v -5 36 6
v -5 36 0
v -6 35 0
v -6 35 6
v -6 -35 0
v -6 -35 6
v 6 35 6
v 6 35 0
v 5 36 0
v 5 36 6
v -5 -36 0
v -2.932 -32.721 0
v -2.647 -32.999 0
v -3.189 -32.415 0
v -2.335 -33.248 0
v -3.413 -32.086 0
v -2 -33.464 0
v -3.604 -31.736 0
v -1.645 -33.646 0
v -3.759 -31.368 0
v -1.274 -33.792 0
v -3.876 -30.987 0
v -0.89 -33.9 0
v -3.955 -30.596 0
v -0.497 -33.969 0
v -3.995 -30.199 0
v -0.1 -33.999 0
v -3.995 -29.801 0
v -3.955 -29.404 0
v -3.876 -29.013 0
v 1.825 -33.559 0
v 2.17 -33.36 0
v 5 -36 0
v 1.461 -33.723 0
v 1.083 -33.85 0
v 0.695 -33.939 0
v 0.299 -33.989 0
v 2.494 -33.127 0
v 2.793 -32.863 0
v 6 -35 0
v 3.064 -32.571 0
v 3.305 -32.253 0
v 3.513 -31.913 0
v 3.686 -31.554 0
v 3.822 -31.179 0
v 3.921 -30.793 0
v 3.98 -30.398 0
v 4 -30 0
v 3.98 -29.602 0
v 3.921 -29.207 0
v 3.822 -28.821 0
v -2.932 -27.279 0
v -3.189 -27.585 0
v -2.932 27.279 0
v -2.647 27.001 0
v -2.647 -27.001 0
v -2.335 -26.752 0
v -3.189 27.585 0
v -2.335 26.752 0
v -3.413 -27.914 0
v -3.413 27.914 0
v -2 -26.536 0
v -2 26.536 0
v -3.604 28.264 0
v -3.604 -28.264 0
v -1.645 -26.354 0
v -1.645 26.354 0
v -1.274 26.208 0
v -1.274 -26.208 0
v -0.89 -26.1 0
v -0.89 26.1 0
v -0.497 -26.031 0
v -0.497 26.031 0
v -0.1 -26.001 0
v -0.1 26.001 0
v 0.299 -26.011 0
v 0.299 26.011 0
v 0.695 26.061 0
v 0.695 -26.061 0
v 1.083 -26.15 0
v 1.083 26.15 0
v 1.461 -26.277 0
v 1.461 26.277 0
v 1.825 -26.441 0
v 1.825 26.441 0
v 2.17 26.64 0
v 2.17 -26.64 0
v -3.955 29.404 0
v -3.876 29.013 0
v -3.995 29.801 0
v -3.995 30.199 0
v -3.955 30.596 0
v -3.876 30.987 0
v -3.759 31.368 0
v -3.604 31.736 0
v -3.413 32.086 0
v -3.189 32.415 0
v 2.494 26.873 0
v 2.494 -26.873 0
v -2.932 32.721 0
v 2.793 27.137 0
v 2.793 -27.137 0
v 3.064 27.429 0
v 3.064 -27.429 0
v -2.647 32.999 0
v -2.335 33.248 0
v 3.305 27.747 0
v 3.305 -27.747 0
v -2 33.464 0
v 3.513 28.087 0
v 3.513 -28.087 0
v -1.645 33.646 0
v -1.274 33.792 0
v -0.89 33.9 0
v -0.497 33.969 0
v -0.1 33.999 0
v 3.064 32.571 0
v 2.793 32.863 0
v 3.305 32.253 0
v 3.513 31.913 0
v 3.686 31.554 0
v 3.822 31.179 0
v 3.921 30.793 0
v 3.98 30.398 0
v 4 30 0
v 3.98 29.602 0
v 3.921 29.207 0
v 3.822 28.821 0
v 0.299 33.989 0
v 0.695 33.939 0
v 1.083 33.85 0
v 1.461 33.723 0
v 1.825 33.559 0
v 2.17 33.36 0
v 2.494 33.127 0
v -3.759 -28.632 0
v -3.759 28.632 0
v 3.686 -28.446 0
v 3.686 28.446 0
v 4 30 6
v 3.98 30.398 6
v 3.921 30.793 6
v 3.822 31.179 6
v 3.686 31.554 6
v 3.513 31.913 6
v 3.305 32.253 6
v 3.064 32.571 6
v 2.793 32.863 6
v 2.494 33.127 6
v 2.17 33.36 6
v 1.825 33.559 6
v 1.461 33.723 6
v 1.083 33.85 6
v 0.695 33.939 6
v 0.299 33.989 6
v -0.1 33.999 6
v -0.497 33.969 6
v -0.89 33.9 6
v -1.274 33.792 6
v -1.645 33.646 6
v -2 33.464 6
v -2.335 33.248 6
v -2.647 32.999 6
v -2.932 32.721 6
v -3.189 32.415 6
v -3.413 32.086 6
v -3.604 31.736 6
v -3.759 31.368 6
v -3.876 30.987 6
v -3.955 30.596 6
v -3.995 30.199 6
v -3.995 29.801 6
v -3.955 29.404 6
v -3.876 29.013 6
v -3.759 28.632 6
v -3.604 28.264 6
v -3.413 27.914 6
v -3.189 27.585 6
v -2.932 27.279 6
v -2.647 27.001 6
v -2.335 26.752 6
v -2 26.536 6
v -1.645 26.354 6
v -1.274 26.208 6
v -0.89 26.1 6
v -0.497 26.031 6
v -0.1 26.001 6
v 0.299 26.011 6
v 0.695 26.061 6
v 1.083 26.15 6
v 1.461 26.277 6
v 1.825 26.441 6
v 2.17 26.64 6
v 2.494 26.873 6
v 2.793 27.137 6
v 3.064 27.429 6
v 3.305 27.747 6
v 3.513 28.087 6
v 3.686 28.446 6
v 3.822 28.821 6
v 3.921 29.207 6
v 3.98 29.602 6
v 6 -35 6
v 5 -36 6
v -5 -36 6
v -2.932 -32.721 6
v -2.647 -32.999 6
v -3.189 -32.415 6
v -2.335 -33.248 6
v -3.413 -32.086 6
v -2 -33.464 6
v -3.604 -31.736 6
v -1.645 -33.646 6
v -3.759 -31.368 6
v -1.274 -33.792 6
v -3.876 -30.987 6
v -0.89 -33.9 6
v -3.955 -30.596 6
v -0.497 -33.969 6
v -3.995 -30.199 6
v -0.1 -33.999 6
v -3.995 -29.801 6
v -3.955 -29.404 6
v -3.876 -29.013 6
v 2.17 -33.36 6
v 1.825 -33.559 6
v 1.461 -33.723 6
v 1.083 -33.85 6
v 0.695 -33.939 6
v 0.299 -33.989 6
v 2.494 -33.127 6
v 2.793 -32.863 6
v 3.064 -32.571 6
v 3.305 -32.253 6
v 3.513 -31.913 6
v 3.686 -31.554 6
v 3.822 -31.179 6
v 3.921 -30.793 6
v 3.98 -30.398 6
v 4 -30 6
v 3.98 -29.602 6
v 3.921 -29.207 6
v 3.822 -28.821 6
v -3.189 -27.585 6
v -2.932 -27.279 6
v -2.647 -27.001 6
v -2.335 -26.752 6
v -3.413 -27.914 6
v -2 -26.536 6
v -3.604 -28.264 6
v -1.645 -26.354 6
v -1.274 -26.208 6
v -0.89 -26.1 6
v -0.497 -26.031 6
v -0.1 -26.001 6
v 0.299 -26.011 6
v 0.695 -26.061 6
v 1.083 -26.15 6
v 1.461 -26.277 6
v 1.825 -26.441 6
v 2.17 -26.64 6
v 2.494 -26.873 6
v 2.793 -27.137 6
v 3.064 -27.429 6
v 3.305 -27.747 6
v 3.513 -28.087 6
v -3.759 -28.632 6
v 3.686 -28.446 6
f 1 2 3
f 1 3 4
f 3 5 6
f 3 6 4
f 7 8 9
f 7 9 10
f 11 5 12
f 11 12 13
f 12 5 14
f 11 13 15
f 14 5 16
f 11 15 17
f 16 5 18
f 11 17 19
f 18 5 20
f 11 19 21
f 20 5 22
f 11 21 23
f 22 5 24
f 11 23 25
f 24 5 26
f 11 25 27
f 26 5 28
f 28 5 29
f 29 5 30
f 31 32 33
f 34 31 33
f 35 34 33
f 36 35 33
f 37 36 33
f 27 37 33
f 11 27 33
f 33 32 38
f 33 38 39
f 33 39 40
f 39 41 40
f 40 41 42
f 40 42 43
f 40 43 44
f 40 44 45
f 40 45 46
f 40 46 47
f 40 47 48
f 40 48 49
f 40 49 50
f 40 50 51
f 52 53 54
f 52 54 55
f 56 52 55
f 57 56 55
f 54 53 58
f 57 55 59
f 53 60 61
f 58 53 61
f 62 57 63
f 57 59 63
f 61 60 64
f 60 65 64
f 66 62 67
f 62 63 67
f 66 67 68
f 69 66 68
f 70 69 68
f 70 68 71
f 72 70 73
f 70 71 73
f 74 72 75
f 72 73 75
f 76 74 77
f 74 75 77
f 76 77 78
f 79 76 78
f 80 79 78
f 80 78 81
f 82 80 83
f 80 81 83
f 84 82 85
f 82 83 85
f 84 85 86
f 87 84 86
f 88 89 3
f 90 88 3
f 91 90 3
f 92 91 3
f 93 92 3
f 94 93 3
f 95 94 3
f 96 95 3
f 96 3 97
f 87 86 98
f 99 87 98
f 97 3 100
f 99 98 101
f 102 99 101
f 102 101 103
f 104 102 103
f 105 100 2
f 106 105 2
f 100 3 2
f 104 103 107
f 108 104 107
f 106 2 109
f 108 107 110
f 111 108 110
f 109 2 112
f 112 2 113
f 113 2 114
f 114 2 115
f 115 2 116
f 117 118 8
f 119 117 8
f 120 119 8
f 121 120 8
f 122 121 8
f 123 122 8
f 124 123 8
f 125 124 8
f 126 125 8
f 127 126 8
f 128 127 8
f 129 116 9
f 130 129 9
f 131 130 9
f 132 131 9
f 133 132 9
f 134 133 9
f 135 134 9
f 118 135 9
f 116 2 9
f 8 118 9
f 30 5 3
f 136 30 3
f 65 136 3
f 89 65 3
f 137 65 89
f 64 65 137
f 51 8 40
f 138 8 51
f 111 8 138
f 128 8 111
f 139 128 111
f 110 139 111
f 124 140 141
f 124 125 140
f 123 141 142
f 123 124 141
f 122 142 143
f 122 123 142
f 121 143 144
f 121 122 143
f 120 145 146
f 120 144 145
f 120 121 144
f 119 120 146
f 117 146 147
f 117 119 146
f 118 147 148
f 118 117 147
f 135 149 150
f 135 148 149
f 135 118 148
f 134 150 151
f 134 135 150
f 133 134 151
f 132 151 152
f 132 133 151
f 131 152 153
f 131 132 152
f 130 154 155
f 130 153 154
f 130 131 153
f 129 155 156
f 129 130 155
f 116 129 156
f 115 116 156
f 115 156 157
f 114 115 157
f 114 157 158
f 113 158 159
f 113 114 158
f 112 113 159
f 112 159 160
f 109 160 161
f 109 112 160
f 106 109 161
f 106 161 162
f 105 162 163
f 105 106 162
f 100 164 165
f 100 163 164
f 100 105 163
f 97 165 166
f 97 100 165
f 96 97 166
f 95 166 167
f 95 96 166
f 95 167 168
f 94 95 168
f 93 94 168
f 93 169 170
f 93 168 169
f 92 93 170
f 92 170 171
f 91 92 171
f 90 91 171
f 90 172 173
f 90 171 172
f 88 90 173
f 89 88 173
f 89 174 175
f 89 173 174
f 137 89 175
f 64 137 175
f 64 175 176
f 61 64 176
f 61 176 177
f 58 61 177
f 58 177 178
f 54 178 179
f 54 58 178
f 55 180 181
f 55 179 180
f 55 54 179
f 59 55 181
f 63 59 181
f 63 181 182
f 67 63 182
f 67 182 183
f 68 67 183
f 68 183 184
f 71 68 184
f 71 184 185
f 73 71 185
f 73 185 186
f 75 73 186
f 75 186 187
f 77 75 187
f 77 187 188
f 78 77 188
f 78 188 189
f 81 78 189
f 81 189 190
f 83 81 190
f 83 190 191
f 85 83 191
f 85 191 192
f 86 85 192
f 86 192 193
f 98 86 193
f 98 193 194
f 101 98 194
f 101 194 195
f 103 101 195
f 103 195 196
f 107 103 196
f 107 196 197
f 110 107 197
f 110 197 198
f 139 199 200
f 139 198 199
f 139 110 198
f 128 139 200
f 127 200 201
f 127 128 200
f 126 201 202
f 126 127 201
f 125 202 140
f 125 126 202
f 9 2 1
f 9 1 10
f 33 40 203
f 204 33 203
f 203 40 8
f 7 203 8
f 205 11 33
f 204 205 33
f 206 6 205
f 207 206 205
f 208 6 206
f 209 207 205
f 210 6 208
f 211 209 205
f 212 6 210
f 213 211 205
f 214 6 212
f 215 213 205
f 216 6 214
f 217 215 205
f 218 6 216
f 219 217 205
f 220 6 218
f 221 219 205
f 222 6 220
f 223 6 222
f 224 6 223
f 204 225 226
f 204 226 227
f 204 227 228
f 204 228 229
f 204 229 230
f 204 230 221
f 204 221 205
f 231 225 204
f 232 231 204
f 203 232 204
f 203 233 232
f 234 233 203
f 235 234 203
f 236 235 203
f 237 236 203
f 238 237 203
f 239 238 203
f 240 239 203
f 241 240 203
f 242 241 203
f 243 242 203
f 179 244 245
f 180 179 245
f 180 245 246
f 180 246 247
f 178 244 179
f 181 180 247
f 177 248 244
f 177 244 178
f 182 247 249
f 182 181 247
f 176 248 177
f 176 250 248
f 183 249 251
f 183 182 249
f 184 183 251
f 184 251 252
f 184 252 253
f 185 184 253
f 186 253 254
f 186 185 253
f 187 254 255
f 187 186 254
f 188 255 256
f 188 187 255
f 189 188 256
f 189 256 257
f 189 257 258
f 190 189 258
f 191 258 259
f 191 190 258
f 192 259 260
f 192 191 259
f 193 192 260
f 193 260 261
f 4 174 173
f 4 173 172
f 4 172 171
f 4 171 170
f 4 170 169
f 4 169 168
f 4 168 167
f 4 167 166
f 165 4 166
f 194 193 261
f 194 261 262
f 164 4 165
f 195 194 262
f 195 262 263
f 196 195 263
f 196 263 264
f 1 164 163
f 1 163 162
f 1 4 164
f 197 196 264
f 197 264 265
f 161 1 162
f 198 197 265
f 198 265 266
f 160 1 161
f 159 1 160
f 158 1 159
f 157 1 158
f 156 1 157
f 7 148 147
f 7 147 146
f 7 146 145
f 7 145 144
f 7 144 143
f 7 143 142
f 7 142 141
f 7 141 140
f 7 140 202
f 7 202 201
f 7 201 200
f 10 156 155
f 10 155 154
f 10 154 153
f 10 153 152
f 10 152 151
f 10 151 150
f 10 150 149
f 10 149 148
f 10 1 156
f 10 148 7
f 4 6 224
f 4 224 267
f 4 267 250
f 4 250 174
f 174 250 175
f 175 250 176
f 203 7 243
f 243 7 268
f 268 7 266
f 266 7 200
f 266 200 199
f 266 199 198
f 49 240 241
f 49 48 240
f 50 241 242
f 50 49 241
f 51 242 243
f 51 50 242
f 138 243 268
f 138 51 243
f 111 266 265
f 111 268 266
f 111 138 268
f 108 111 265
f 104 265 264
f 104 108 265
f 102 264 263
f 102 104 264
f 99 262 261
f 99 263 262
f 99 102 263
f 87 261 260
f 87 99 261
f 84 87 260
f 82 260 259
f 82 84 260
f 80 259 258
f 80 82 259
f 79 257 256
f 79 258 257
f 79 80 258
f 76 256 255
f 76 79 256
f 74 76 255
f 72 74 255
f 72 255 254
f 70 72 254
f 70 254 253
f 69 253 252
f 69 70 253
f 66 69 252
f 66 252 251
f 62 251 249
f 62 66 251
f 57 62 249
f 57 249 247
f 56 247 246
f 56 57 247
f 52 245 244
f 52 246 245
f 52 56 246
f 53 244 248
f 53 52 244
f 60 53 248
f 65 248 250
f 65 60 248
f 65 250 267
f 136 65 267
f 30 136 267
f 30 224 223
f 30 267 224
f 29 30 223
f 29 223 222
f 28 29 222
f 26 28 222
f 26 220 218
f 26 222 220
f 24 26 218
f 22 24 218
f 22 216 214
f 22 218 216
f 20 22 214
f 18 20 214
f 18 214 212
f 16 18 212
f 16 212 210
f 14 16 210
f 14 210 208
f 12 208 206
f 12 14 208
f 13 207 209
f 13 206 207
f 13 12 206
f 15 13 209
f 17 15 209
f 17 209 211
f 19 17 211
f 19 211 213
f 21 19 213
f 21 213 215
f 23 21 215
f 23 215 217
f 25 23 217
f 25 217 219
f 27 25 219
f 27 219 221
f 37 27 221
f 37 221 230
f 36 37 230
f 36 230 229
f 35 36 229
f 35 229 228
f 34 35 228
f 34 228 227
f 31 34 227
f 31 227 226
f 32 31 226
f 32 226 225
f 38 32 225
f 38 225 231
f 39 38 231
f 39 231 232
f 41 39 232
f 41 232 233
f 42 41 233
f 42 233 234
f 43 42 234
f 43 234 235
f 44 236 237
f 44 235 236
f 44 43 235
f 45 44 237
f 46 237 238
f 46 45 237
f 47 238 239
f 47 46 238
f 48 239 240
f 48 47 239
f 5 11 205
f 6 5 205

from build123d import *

# Parameters (mm, degrees)
SKETCH_4_W               = 12
SKETCH_4_H               = 72
EXTRUDE_1_DEPTH          = 6
CUT_EXTRUDE_1_DEPTH      = 37.986484018
CUT_EXTRUDE_1_DEPTH_BACK = 37.986484018
SKETCH_5_R               = 4
CHAMFER_1_SIZE           = 1


with BuildPart() as part:
    # ｽｹｯﾁ4 → ﾎﾞｽ - 押し出し1 (new body)
    with BuildSketch(Plane.XY):
        Rectangle(SKETCH_4_W, SKETCH_4_H)
    extrude(amount=EXTRUDE_1_DEPTH)

    # ｽｹｯﾁ5 → ｶｯﾄ - 押し出し1 (cut, two sides: drawn at the far end of the back side and taken through both)
    with BuildSketch(Plane.XY.offset(6).offset(-CUT_EXTRUDE_1_DEPTH_BACK)):
        with Locations((0, 30)):
            Circle(SKETCH_5_R)
        with Locations((0, -30)):
            Circle(SKETCH_5_R)
    extrude(amount=CUT_EXTRUDE_1_DEPTH + CUT_EXTRUDE_1_DEPTH_BACK, mode=Mode.SUBTRACT)

    # 面取り1
    chamfer_1_edges = [part.edges().sort_by_distance(p)[0] for p in [
        (6, -36, 3),
        (-6, -36, 3),
        (-6, 36, 3),
        (6, 36, 3),
    ]]
    chamfer(chamfer_1_edges, length=CHAMFER_1_SIZE)


solid = part.part
